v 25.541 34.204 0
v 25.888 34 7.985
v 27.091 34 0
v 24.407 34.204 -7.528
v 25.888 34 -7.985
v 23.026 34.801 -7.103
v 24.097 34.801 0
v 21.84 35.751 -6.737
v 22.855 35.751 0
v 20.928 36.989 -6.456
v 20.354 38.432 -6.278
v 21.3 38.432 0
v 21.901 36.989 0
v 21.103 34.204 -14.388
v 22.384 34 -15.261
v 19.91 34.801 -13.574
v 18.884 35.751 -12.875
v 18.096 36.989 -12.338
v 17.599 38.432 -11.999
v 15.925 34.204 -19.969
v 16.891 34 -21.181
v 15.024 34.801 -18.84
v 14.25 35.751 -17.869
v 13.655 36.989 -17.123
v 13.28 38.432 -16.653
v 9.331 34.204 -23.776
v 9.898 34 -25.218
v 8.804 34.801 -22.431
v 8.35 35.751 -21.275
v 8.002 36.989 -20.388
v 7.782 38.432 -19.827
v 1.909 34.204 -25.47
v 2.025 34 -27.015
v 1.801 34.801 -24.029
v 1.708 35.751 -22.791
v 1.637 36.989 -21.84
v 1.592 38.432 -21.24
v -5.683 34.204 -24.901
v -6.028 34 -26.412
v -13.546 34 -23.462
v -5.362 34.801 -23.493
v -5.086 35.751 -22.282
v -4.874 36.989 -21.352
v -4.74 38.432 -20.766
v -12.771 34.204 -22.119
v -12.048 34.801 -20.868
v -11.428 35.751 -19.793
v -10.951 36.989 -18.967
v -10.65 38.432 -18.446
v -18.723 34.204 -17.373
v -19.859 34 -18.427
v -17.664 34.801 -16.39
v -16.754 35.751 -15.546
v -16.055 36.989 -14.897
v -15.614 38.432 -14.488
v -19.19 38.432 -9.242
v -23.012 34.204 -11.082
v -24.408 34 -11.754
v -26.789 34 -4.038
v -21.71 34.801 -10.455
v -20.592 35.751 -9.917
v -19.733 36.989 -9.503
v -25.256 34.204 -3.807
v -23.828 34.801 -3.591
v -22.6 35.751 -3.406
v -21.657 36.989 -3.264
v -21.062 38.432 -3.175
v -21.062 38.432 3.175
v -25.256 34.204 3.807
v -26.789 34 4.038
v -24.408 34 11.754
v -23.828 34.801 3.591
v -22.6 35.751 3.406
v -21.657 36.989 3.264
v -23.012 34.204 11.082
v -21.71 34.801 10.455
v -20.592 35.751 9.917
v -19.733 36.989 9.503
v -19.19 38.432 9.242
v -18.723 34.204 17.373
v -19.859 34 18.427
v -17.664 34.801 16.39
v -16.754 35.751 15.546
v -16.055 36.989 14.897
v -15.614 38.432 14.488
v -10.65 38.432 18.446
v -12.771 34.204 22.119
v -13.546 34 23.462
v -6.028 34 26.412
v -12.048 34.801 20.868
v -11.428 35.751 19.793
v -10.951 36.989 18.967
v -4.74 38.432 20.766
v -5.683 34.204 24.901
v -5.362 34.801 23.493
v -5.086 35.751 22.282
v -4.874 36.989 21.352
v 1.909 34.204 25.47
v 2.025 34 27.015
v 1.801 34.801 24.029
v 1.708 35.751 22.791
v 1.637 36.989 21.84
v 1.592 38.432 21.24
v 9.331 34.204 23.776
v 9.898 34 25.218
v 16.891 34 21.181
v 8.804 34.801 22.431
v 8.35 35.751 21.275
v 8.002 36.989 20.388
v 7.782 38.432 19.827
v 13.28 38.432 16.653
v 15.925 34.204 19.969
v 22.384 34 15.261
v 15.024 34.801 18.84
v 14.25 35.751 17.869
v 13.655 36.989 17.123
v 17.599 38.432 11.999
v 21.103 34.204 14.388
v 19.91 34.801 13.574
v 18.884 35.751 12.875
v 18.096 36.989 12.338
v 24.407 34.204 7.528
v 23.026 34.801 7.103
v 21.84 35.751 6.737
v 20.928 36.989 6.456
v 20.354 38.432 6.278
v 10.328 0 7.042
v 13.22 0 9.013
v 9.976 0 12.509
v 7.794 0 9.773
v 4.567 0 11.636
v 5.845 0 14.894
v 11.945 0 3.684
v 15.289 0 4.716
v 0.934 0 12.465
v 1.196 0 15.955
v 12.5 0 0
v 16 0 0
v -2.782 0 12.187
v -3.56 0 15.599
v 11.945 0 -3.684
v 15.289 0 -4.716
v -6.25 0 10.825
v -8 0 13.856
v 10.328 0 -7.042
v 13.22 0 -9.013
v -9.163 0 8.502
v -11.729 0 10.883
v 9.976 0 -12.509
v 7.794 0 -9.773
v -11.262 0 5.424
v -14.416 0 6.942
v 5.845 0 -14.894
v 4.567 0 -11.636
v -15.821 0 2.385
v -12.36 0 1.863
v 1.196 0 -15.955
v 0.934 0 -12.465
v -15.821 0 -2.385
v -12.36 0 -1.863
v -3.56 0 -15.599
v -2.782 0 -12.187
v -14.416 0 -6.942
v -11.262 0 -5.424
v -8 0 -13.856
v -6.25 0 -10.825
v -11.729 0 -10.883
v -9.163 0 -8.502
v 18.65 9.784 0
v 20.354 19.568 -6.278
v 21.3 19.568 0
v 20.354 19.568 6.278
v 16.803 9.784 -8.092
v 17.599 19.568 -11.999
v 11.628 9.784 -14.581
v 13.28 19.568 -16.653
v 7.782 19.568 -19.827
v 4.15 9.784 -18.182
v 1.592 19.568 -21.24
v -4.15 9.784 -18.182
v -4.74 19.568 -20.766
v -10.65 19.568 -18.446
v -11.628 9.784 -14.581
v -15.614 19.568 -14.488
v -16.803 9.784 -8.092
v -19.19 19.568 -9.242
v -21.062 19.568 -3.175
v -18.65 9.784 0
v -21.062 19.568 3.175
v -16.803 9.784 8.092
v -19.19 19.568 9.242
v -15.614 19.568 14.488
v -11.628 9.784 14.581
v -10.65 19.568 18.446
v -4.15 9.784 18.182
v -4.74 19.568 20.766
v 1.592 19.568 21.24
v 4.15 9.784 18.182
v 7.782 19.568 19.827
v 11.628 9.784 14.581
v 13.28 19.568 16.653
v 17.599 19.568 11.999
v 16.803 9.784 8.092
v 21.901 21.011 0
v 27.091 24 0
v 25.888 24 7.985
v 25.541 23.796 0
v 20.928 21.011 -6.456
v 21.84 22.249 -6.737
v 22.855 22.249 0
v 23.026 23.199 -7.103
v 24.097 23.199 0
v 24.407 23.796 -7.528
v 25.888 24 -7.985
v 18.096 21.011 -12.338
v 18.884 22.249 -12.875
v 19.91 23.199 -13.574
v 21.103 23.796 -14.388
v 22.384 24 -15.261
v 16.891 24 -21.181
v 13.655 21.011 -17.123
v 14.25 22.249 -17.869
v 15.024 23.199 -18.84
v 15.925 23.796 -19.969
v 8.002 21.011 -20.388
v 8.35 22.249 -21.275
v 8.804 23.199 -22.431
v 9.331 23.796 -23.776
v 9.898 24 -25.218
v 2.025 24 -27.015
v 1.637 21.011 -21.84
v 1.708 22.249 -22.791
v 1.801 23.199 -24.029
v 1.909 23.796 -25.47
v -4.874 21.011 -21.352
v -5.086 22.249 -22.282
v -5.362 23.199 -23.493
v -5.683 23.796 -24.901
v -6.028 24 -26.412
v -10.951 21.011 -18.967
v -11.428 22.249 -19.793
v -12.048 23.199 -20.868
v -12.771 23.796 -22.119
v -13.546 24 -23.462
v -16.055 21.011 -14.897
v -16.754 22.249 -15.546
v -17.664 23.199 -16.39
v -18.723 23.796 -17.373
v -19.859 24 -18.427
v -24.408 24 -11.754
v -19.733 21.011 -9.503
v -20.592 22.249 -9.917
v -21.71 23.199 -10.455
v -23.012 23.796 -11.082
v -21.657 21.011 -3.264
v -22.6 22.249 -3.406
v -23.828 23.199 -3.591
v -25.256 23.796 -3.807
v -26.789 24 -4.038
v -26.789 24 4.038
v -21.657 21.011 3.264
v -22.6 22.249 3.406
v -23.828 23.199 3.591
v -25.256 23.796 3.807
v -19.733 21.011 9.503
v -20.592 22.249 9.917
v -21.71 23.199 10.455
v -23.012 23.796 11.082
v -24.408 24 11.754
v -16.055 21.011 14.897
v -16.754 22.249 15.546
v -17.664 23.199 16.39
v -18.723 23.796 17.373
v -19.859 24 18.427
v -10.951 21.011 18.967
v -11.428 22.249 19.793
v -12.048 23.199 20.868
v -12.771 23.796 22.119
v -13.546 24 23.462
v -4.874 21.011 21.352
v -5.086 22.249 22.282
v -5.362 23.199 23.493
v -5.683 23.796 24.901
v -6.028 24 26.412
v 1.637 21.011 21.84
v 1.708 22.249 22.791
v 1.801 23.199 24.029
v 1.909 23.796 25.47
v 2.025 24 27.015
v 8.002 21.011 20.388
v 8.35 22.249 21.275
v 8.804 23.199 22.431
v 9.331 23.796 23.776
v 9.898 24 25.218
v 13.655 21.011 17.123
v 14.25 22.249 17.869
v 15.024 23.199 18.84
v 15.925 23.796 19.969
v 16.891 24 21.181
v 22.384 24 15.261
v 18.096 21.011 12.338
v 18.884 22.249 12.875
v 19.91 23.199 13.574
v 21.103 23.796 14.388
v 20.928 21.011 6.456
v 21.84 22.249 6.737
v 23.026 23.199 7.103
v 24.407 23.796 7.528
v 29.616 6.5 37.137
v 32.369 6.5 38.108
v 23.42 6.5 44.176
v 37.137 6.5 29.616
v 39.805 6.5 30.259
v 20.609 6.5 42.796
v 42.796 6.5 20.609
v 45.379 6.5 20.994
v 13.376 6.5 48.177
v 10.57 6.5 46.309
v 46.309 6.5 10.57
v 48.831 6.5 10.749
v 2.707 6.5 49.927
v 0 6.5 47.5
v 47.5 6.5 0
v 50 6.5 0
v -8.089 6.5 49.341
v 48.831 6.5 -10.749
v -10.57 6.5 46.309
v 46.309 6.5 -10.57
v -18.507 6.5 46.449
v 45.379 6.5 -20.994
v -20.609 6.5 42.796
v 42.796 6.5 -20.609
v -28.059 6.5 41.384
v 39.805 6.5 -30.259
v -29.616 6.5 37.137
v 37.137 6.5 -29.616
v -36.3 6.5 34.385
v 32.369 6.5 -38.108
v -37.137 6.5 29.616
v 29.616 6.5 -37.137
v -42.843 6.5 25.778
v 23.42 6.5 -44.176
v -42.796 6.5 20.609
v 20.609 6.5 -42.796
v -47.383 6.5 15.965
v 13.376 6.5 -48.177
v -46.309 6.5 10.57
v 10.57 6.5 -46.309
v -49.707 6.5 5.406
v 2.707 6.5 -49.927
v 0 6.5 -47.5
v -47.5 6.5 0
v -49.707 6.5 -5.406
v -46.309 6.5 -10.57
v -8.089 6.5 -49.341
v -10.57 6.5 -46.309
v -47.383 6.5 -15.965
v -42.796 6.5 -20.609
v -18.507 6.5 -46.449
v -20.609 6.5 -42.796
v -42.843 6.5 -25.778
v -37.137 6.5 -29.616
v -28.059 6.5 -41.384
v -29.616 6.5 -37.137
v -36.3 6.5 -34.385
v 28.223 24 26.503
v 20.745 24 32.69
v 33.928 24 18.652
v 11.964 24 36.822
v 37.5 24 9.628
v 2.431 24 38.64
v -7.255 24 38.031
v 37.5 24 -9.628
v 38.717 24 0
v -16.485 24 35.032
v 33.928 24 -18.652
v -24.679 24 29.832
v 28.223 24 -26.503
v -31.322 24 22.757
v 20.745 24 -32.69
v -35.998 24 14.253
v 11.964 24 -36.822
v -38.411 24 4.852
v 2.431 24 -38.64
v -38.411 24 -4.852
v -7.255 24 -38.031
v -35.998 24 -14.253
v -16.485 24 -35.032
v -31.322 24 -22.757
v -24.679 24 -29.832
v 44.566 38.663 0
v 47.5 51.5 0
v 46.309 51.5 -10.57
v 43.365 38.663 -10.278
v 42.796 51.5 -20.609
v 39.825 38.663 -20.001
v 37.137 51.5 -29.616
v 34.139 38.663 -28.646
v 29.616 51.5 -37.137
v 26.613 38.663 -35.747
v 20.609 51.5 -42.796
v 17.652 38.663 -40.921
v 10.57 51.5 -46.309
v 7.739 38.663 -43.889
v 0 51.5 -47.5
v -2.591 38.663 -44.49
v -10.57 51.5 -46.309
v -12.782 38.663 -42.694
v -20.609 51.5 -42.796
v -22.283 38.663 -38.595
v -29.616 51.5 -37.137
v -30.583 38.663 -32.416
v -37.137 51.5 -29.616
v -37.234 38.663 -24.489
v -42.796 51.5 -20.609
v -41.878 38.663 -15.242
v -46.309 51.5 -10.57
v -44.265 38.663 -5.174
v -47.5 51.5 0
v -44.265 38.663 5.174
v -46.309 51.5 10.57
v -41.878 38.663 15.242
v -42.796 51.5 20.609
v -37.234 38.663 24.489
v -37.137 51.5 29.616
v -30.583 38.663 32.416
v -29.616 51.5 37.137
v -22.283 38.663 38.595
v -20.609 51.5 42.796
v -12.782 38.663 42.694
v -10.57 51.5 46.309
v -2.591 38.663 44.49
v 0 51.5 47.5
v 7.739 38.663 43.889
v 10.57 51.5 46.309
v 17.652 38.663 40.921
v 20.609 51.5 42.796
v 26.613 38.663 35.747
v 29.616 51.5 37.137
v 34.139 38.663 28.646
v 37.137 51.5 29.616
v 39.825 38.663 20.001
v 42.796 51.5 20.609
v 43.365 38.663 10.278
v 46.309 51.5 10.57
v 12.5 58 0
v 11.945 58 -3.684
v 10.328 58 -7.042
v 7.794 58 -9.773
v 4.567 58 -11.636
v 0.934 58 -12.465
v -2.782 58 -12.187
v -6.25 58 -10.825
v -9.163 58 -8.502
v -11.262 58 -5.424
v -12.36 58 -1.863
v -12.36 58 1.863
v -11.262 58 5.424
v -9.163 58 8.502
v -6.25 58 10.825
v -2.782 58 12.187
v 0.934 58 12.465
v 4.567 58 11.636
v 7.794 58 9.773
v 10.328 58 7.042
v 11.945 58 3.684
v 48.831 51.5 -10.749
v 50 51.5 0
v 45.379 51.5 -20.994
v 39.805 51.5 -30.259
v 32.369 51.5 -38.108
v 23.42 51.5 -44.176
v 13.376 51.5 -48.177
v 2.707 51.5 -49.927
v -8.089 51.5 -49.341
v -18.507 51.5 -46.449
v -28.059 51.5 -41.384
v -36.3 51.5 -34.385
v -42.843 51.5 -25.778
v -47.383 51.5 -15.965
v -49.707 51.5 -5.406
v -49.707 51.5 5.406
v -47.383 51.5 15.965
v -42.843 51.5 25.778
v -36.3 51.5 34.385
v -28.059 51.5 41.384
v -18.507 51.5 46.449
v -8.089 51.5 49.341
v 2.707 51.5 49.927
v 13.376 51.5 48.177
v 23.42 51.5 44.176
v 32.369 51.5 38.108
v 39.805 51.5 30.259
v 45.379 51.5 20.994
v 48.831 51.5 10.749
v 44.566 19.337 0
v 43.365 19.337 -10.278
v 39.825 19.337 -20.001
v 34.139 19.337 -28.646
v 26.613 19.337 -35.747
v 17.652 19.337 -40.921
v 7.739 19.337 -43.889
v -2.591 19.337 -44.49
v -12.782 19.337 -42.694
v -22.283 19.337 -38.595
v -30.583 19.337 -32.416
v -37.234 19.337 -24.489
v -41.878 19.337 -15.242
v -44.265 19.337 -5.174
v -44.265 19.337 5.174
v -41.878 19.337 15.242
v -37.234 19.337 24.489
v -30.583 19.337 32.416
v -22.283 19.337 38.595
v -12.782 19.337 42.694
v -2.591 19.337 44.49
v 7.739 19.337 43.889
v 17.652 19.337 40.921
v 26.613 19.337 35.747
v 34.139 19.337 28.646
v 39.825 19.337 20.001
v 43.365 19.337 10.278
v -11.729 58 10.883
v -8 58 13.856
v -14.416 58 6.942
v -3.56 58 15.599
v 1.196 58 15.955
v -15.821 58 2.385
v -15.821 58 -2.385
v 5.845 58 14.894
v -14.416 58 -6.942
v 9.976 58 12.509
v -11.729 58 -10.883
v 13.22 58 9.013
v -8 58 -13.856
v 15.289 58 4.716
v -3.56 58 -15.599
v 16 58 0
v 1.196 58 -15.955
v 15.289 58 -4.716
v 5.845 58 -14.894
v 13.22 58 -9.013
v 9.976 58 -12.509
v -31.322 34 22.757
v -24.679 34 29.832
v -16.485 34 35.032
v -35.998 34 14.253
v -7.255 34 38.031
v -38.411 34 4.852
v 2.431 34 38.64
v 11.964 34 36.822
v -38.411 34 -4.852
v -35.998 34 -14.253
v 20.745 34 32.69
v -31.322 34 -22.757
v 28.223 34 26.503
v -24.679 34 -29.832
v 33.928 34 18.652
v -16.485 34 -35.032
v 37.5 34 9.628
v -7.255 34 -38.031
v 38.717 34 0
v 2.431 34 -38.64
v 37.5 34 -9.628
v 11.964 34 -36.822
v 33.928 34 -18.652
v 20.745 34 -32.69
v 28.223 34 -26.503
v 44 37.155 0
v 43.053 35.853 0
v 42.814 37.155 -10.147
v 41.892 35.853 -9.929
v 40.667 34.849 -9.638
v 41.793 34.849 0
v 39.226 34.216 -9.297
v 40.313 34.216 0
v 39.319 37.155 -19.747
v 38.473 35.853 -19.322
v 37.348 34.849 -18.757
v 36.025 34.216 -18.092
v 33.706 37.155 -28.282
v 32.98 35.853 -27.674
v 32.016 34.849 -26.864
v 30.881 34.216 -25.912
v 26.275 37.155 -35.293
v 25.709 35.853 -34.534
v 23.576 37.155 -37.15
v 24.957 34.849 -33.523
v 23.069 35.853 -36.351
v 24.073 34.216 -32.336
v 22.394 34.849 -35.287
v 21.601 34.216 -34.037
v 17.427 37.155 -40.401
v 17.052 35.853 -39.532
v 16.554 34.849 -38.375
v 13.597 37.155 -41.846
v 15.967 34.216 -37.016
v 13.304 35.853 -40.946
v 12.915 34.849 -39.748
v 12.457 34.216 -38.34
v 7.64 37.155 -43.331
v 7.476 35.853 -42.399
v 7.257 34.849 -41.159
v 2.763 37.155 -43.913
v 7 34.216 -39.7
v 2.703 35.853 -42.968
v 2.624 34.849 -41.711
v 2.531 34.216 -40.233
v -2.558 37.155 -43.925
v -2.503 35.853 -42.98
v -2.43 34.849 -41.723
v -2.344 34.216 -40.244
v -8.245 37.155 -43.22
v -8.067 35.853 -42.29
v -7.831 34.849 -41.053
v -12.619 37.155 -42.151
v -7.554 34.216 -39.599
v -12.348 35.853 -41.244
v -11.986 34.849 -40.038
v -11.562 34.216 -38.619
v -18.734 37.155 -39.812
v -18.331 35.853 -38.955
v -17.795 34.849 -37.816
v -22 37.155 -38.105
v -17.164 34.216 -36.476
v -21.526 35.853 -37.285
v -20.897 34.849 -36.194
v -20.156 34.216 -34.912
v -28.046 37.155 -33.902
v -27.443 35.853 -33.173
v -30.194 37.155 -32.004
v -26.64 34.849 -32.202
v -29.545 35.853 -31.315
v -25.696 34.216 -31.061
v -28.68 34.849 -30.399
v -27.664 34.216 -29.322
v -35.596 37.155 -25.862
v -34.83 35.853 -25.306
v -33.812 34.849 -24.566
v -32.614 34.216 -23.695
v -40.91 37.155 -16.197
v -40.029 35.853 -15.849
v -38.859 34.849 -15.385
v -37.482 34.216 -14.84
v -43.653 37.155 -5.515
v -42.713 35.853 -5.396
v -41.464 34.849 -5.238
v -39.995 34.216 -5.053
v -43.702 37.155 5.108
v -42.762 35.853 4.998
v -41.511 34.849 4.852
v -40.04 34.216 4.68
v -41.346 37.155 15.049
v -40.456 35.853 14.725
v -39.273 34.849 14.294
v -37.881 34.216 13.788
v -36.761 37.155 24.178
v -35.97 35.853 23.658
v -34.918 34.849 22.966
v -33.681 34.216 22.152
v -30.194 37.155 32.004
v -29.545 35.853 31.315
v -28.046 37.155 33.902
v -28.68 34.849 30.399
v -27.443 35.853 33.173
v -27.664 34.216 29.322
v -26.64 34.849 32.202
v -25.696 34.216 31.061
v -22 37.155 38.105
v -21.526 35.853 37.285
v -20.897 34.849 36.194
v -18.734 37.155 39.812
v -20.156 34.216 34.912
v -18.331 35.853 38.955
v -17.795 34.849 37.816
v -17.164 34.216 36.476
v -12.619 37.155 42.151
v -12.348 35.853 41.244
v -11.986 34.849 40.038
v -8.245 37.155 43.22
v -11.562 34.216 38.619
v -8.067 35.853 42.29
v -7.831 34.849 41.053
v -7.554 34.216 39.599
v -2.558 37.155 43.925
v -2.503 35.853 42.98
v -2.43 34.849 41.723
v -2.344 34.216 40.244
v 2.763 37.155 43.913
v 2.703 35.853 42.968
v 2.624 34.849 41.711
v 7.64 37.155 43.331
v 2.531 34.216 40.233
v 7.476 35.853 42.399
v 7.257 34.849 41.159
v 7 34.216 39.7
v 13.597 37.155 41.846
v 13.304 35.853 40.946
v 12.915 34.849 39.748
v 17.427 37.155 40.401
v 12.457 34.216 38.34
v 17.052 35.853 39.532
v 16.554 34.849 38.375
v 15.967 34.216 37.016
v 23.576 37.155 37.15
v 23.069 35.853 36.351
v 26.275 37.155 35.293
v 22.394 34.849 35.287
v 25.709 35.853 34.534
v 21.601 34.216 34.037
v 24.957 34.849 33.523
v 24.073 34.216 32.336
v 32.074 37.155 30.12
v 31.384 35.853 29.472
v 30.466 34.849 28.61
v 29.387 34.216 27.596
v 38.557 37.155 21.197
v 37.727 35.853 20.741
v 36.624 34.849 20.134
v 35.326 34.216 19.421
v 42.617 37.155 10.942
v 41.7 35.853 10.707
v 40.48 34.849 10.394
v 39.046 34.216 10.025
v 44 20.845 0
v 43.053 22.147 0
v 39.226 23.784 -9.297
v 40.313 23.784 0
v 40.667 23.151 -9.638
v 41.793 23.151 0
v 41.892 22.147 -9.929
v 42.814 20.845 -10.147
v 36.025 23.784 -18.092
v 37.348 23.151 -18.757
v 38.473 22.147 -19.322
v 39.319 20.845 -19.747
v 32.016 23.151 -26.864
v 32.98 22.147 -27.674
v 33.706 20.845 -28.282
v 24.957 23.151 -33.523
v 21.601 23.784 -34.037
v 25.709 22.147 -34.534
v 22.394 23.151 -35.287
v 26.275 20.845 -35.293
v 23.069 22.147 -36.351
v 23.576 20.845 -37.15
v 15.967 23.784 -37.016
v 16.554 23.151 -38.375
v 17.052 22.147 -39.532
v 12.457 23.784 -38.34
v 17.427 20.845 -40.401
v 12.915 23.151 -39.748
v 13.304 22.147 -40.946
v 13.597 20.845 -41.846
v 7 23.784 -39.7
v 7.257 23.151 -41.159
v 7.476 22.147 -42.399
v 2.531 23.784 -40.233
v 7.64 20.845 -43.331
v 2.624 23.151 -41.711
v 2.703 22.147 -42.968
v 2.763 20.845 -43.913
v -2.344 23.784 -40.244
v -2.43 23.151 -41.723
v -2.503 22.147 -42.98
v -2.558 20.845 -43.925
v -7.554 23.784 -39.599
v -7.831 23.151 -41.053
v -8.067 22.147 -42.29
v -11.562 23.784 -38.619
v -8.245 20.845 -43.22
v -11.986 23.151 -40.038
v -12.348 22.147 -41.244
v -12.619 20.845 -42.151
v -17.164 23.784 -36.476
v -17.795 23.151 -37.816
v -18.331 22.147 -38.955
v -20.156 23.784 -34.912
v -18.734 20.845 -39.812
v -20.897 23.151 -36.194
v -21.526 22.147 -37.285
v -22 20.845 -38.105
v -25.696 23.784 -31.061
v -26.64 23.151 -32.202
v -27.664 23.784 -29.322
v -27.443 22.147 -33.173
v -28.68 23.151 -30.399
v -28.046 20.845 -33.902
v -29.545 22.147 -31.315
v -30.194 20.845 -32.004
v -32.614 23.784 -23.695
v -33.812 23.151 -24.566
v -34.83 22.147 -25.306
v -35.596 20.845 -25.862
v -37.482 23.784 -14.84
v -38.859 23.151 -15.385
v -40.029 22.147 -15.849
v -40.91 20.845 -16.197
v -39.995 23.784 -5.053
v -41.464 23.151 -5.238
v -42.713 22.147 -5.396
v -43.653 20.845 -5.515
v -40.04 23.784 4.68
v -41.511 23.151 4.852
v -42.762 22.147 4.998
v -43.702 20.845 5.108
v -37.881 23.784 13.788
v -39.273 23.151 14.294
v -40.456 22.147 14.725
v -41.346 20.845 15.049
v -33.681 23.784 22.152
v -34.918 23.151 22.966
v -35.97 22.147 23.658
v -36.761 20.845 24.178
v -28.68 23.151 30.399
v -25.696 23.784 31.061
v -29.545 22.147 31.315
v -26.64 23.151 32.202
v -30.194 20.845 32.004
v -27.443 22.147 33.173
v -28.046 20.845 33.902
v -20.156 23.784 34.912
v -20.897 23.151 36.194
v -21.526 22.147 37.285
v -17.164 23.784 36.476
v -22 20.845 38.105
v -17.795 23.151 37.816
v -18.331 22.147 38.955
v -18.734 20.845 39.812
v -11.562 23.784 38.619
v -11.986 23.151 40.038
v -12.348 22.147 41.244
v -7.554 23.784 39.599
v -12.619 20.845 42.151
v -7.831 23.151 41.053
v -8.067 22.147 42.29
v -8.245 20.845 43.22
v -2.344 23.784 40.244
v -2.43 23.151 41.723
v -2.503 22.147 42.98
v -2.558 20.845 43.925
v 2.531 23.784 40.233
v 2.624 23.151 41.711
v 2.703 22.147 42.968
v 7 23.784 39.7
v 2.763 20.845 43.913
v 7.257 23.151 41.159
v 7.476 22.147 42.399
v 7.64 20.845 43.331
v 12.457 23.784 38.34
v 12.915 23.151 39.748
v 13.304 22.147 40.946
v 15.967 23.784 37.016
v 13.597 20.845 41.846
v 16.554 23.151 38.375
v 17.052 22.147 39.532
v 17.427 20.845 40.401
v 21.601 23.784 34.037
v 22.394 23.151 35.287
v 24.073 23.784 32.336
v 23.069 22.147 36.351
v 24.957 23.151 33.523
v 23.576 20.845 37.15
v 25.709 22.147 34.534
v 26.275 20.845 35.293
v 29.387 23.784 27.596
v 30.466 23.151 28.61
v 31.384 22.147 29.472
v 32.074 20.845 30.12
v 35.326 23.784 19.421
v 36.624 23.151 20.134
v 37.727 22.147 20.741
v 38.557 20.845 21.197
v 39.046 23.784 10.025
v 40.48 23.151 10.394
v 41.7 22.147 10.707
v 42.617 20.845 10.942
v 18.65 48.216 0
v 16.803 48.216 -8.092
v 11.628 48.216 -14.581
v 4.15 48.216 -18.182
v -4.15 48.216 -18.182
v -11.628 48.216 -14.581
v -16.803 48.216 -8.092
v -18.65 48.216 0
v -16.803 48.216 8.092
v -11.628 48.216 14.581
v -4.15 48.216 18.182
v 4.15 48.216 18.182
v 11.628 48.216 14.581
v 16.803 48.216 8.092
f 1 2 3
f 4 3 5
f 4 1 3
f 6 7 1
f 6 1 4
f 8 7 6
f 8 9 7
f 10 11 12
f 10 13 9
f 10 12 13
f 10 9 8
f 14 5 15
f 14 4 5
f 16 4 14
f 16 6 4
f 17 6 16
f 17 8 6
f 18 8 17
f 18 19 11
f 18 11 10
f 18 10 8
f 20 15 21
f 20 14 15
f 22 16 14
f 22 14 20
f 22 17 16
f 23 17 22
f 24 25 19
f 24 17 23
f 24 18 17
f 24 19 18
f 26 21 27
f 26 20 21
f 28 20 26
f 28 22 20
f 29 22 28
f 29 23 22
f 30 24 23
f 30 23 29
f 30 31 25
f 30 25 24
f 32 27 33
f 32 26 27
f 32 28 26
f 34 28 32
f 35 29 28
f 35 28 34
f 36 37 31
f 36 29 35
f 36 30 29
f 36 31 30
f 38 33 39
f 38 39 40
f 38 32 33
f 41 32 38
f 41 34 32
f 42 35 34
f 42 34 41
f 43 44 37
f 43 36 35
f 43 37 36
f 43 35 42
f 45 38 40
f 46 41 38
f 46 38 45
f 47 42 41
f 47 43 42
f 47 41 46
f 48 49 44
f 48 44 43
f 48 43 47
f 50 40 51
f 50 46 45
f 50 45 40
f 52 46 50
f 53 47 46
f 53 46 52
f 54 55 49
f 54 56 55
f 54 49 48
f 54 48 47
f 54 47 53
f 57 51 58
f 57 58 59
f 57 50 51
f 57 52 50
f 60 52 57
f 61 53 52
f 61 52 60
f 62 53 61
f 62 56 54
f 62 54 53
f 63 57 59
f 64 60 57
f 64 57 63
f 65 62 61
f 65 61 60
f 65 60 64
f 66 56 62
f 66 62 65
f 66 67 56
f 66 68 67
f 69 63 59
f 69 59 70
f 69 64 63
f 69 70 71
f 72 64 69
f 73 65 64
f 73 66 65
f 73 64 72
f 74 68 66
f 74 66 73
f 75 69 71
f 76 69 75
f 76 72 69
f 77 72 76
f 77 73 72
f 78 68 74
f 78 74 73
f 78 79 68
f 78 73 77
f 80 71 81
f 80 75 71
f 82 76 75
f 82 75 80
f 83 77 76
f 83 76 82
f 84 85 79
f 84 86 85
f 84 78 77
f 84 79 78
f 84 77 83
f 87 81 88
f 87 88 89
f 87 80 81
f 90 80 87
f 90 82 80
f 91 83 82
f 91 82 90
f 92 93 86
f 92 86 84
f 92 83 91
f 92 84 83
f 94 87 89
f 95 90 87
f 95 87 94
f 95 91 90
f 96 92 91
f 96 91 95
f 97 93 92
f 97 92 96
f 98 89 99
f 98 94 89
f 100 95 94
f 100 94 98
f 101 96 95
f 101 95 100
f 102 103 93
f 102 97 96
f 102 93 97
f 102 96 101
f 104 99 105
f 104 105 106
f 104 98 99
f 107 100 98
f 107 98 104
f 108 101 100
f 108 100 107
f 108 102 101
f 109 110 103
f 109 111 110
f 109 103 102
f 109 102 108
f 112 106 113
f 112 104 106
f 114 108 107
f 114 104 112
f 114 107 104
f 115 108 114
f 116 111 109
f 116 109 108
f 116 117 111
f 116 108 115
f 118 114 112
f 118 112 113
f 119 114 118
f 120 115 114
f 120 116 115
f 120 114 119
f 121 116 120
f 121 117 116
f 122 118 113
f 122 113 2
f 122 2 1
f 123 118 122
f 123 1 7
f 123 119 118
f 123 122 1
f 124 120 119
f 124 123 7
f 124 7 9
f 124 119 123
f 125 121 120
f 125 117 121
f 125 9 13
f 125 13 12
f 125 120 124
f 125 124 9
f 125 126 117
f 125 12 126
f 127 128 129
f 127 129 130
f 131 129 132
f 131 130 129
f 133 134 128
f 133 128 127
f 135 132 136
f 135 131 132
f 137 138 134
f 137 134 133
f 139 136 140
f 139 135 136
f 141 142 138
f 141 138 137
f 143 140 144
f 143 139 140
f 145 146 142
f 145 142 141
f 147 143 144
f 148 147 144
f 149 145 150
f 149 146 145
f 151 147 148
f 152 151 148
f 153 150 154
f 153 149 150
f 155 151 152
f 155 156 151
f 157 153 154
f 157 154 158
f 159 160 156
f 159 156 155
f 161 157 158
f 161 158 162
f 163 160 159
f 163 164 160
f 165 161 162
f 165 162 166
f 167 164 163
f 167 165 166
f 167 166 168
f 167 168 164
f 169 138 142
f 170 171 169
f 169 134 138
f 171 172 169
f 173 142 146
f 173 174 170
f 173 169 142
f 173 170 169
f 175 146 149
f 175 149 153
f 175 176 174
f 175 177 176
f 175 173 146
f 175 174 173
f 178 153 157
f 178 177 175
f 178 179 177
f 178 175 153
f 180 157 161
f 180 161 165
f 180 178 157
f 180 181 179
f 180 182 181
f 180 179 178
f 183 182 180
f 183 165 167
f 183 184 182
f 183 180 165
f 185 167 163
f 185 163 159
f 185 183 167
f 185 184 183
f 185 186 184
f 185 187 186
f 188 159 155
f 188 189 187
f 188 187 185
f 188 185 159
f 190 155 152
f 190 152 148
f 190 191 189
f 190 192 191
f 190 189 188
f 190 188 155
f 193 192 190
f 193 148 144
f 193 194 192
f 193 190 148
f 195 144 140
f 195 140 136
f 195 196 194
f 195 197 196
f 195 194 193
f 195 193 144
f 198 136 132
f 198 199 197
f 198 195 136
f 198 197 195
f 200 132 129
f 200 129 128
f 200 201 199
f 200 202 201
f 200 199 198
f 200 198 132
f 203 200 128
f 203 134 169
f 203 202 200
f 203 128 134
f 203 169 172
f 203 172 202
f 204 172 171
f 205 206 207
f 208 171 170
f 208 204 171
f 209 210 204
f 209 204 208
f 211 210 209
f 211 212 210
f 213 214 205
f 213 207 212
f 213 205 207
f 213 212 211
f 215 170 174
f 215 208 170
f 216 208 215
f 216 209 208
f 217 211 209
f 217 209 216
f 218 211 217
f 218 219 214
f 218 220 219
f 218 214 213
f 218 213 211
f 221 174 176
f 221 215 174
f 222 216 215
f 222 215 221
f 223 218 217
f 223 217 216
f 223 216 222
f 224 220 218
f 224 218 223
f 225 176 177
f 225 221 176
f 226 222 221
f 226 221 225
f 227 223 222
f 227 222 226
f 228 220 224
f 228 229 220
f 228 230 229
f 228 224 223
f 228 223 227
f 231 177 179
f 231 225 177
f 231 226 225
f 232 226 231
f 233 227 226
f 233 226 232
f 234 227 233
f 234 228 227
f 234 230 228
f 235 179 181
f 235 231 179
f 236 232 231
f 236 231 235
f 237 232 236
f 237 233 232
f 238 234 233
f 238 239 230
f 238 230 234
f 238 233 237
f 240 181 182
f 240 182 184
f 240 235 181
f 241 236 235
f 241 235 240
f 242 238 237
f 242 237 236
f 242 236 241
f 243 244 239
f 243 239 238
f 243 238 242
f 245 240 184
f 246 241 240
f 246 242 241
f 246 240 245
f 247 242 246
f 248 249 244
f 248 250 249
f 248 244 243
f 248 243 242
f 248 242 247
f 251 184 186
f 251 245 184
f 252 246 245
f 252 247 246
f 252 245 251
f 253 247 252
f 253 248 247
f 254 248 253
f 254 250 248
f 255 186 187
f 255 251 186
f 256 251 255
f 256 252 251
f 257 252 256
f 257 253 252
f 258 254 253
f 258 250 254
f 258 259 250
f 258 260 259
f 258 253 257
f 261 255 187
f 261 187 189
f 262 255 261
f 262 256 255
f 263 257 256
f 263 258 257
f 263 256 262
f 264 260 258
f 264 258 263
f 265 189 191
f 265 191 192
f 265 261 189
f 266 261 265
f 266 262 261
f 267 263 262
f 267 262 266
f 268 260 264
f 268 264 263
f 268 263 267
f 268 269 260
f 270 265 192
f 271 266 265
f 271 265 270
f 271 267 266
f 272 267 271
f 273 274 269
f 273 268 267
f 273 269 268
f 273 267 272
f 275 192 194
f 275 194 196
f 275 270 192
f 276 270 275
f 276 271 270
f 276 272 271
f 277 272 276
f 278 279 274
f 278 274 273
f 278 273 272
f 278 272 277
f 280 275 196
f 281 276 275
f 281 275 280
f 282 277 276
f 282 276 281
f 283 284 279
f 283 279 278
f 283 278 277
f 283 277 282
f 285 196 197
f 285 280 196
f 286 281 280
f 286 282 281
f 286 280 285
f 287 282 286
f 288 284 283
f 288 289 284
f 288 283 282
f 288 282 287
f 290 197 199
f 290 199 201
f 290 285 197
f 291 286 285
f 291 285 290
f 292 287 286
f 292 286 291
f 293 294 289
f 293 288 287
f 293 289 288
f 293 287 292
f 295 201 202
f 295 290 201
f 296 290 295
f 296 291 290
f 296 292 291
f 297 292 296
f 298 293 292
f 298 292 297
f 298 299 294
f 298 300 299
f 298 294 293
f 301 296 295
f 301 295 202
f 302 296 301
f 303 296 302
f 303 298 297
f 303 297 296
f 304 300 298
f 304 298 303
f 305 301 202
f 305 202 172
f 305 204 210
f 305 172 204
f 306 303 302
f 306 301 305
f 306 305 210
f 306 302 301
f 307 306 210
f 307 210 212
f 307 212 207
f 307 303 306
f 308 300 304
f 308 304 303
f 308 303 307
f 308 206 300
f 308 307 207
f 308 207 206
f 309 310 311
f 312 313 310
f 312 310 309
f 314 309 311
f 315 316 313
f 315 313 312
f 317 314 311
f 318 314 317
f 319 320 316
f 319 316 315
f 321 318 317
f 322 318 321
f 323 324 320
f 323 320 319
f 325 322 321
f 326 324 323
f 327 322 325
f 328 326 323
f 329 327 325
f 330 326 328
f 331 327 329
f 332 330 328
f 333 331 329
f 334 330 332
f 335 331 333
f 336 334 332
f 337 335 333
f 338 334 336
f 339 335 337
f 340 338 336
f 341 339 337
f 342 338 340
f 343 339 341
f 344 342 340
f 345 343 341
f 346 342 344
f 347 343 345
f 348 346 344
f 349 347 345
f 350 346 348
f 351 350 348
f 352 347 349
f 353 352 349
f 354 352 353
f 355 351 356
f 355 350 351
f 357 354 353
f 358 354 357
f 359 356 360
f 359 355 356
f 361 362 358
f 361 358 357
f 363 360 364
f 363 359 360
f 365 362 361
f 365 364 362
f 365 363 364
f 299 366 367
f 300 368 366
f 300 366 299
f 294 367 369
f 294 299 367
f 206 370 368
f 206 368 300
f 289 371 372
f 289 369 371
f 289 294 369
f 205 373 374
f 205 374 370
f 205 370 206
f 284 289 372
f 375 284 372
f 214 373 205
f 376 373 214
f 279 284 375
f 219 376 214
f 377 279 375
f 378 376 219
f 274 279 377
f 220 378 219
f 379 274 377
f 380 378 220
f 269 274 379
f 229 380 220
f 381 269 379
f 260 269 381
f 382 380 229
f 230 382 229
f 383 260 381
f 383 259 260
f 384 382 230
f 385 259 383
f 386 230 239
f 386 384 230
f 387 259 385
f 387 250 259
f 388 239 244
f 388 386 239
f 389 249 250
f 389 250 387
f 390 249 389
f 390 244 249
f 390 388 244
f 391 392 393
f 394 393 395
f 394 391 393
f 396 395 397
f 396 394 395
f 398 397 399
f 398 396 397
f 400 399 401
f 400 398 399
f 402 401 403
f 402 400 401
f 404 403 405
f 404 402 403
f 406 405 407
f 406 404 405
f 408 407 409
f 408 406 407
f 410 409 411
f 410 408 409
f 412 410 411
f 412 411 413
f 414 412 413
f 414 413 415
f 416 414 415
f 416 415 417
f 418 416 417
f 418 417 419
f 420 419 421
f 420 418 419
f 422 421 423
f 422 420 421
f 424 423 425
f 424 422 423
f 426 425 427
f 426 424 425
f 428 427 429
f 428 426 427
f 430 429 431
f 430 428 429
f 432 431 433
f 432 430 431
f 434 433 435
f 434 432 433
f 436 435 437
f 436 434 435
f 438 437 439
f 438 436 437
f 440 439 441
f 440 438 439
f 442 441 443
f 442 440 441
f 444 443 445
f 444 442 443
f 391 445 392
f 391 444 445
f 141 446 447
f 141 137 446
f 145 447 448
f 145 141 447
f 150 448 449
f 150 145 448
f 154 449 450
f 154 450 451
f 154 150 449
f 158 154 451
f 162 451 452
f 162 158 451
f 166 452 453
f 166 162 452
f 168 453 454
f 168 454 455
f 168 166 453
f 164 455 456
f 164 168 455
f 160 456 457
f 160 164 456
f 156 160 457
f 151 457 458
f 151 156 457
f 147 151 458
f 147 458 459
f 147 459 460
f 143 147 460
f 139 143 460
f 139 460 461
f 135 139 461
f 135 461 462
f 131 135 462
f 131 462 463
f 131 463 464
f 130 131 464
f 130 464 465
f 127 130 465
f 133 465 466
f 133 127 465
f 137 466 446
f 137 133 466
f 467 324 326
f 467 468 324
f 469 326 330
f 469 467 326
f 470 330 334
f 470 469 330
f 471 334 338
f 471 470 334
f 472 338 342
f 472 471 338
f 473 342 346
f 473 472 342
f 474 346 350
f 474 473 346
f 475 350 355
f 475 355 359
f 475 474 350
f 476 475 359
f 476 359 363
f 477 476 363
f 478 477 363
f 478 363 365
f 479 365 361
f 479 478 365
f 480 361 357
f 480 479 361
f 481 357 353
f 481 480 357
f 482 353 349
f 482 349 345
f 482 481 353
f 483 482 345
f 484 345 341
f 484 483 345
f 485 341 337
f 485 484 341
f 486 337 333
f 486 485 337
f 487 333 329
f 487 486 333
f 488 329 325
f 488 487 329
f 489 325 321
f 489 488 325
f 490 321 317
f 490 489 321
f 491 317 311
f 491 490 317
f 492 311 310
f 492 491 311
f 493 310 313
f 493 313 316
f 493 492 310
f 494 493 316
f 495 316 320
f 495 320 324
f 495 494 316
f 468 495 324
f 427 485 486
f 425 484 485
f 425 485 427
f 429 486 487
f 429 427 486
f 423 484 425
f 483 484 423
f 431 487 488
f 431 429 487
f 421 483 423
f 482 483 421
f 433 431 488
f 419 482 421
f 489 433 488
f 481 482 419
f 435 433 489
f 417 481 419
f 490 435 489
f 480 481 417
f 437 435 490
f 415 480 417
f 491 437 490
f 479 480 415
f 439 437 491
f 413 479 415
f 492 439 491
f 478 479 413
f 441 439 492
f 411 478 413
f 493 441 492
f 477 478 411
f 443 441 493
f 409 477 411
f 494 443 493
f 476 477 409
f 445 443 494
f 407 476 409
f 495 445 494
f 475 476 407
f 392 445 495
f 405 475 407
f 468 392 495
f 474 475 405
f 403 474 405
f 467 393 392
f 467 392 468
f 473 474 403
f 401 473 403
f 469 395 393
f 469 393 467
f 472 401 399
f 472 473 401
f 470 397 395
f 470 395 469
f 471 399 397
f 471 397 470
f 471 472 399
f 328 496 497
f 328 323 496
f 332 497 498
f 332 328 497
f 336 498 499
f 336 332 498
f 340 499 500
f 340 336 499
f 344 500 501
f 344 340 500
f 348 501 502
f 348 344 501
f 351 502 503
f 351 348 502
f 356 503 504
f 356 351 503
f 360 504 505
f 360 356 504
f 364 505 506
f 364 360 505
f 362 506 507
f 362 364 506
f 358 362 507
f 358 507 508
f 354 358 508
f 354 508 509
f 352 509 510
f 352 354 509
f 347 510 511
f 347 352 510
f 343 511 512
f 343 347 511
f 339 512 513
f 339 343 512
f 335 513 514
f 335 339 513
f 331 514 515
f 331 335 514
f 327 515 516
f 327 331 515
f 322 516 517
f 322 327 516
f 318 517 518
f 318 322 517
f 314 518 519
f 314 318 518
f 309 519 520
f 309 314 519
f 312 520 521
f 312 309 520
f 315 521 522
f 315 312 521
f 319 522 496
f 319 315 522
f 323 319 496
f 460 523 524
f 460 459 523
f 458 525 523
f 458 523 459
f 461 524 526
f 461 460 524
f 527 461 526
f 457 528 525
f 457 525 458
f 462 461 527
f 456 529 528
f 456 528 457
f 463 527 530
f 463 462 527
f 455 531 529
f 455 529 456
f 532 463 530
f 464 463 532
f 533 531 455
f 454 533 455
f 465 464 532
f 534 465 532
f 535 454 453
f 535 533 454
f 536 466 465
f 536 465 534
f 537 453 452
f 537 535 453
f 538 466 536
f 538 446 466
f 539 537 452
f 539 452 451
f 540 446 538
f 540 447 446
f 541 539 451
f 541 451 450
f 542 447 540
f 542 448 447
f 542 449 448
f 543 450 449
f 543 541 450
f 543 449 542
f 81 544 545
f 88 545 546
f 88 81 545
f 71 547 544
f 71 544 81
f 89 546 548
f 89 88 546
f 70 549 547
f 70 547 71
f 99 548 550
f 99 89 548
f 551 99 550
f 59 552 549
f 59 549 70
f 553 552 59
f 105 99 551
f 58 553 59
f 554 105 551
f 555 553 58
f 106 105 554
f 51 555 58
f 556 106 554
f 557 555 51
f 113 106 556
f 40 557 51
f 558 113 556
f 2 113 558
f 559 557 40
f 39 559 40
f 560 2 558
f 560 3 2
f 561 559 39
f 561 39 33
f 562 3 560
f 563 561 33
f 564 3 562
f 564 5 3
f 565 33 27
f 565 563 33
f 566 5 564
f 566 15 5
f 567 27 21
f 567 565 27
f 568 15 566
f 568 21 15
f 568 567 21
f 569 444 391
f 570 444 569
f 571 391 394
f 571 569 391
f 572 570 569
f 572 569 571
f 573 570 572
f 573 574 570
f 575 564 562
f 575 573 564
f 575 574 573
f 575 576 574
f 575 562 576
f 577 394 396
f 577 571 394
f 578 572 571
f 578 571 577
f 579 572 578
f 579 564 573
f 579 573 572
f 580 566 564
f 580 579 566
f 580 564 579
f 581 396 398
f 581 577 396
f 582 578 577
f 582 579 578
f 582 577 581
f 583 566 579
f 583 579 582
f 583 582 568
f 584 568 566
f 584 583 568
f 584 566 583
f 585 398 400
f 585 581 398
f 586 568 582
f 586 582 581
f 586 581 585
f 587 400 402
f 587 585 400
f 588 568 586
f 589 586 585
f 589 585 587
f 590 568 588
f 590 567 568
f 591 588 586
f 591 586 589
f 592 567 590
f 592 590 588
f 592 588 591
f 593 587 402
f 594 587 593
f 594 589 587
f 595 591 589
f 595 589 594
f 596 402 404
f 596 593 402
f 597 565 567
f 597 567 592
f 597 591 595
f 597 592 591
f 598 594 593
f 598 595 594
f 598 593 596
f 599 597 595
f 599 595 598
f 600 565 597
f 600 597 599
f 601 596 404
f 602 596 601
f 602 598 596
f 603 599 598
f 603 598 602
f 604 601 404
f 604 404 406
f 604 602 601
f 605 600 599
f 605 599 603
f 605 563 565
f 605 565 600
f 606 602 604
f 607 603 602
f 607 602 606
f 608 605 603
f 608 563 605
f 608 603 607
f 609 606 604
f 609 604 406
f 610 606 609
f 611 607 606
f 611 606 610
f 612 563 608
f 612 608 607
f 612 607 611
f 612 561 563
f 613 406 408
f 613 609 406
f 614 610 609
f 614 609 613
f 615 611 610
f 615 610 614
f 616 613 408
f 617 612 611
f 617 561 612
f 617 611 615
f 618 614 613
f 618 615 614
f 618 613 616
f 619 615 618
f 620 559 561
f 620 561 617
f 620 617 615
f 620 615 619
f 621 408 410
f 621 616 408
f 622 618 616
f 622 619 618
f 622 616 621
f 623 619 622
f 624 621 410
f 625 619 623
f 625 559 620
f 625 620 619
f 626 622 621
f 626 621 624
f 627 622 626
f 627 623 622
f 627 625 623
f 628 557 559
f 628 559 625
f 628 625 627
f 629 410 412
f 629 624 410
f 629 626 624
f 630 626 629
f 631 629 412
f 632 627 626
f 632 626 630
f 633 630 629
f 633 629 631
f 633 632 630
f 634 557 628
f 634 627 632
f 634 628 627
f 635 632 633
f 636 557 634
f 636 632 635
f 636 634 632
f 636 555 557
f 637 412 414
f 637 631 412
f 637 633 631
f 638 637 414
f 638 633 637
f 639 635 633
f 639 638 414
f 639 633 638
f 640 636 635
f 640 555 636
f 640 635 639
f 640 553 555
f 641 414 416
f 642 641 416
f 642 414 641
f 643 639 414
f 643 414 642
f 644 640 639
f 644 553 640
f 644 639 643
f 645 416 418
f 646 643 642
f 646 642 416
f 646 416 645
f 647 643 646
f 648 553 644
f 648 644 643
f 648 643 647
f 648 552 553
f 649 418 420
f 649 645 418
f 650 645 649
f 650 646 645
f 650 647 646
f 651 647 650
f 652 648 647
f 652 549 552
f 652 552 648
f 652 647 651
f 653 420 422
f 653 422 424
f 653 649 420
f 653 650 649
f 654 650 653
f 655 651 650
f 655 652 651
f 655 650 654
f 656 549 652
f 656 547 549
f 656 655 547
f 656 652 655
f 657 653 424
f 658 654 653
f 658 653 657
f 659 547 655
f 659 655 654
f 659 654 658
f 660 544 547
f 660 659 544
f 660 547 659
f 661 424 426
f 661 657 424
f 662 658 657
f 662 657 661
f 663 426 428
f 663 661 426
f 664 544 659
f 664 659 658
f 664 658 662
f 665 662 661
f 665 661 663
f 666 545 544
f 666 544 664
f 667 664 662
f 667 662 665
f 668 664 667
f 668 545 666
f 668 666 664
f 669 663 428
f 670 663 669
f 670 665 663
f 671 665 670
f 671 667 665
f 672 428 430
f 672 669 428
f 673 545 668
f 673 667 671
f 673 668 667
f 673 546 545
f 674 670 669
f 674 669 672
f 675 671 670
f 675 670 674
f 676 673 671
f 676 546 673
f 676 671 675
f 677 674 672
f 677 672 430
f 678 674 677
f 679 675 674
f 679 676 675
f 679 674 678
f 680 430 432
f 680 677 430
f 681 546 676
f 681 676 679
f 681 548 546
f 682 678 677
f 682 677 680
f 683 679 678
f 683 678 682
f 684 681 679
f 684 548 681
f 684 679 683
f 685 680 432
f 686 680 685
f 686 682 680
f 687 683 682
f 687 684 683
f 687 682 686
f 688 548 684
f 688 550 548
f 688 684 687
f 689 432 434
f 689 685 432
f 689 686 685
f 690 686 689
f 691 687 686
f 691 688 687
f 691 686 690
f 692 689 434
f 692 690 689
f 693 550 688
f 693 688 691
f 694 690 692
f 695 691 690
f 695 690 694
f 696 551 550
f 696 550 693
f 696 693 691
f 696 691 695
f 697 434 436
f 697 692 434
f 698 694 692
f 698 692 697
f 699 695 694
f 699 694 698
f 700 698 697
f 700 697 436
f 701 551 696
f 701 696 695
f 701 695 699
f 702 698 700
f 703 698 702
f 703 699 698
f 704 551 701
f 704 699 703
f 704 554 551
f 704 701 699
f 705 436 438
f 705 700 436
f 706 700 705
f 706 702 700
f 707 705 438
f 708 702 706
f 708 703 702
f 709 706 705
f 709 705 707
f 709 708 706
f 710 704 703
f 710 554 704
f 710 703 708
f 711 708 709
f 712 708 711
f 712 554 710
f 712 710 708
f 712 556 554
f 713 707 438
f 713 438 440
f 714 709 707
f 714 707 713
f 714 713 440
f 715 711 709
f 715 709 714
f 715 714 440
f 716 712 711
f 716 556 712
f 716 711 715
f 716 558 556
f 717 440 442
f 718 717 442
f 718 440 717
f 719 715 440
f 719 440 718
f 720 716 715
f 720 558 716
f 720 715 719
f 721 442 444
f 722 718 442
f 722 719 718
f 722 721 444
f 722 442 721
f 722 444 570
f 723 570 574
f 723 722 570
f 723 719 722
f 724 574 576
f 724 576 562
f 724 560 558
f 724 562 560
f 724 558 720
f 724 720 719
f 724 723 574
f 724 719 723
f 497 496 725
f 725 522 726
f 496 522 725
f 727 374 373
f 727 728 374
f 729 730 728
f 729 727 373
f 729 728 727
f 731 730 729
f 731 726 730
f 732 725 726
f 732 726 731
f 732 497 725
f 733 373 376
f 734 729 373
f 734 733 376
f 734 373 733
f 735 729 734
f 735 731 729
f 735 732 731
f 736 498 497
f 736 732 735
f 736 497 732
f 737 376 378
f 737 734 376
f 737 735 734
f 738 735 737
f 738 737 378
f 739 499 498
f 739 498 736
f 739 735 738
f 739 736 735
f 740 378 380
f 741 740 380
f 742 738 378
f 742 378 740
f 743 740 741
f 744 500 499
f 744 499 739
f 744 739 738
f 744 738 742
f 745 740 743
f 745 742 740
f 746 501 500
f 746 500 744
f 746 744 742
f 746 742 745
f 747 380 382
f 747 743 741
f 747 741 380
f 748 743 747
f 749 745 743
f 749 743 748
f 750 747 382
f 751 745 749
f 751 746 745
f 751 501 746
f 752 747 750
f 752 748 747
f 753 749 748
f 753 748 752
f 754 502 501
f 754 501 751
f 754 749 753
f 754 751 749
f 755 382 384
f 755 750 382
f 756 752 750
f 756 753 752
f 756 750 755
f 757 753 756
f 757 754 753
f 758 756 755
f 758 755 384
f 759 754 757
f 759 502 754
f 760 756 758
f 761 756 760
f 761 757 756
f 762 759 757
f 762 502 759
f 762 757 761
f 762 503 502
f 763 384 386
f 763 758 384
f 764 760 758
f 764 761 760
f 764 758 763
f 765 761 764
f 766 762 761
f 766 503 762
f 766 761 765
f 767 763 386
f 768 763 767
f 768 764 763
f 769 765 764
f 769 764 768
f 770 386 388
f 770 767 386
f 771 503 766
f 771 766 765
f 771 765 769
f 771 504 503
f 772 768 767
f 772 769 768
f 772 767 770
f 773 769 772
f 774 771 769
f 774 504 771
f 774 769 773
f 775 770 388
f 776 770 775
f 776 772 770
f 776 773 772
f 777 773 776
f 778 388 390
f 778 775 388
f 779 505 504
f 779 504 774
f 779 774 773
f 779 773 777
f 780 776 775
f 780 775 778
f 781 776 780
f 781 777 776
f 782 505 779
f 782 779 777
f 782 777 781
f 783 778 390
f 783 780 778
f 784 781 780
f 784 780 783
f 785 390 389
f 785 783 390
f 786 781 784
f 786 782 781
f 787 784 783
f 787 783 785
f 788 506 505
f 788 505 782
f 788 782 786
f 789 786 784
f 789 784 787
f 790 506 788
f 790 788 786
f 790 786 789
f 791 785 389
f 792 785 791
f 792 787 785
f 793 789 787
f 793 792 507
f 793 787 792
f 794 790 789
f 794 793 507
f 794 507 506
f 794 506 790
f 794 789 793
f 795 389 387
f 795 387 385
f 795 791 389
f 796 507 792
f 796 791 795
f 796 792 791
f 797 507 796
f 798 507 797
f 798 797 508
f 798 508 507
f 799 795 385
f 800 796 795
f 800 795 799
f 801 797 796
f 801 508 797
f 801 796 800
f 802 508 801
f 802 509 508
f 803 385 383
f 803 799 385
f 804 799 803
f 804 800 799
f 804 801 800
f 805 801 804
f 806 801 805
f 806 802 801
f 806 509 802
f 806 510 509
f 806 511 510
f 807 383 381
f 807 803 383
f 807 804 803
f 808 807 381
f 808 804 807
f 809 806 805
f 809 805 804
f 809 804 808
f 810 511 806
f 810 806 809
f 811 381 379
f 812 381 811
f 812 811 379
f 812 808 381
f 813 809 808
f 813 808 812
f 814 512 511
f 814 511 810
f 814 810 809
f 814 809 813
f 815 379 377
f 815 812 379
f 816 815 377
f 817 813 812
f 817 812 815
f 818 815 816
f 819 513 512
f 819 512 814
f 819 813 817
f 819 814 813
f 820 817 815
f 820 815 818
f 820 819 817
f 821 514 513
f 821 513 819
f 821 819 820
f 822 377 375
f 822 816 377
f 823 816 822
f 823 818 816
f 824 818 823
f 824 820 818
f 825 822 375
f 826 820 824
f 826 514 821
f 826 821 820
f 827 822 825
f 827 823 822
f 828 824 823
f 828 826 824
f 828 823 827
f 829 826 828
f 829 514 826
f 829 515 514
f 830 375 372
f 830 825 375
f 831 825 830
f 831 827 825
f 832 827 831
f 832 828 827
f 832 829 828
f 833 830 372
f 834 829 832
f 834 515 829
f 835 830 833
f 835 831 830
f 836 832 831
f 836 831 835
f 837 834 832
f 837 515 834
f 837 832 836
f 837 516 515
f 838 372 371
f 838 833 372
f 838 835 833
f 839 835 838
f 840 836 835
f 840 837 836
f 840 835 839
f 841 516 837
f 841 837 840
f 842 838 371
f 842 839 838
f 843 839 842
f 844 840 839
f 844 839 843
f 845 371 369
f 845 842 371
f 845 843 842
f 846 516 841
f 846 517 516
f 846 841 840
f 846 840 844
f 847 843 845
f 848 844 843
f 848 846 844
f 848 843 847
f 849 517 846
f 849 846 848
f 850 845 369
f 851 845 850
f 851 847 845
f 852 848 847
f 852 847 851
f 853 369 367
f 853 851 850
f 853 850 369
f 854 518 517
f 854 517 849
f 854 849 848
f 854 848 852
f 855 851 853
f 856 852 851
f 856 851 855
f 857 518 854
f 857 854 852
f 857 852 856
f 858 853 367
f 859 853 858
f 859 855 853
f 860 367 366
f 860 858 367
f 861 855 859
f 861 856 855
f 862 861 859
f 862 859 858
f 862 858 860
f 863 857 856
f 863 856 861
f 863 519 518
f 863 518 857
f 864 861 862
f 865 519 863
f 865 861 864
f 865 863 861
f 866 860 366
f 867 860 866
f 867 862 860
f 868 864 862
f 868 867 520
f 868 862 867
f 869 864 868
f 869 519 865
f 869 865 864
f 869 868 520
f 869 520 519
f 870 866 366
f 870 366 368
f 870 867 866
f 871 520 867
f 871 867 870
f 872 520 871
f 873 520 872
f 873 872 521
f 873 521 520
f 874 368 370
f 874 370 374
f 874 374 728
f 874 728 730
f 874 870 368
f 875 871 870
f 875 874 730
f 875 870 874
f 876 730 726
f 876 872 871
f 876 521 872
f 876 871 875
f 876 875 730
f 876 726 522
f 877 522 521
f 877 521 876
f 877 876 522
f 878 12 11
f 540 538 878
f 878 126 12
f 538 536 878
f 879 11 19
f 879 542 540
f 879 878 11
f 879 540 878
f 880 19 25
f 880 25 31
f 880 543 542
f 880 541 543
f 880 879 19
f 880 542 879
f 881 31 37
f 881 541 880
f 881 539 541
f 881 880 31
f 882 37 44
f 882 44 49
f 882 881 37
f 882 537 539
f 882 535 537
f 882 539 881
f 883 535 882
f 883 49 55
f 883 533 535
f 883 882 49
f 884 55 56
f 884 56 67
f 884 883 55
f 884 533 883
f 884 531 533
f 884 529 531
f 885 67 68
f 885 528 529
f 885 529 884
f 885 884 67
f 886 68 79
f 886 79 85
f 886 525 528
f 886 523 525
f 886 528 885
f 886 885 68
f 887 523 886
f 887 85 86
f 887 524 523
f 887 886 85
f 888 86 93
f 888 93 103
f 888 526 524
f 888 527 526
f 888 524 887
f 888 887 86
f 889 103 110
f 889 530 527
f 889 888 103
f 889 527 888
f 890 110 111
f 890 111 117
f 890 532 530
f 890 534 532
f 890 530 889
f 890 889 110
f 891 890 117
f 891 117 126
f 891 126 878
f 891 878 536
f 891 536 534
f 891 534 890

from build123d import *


with BuildPart() as part:
    # Sketch1 → Revolve1 (revolve)
    with BuildSketch(Plane.XY):
        with BuildLine():
            Line((12.5, 0), (16, 0))
            Line((16, 0), (21.299800148, 19.568492854))
            ThreePointArc((21.299800148, 19.568492854), (23.444993074, 22.765026607), (27.09115838, 24))
            Line((27.09115838, 24), (38.716689233, 24))
            ThreePointArc((38.716689233, 24), (42.456896924, 22.69157185), (44.565840272, 19.336948809))
            Line((44.565840272, 19.336948809), (47.5, 6.5))
            Line((47.5, 6.5), (50, 6.5))
            Line((50, 6.5), (50, 51.5))
            Line((50, 51.5), (47.5, 51.5))
            Line((47.5, 51.5), (44.565840272, 38.663051191))
            ThreePointArc((44.565840272, 38.663051191), (42.456896924, 35.30842815), (38.716689233, 34))
            Line((38.716689233, 34), (27.09115838, 34))
            ThreePointArc((27.09115838, 34), (23.444993074, 35.234973393), (21.299800148, 38.431507146))
            Line((21.299800148, 38.431507146), (16, 58))
            Line((16, 58), (12.5, 58))
            Line((12.5, 58), (12.5, 0))
        make_face()
    revolve(axis=Axis((0, 0, 0), (0, 1, 0)))


solid = part.part
